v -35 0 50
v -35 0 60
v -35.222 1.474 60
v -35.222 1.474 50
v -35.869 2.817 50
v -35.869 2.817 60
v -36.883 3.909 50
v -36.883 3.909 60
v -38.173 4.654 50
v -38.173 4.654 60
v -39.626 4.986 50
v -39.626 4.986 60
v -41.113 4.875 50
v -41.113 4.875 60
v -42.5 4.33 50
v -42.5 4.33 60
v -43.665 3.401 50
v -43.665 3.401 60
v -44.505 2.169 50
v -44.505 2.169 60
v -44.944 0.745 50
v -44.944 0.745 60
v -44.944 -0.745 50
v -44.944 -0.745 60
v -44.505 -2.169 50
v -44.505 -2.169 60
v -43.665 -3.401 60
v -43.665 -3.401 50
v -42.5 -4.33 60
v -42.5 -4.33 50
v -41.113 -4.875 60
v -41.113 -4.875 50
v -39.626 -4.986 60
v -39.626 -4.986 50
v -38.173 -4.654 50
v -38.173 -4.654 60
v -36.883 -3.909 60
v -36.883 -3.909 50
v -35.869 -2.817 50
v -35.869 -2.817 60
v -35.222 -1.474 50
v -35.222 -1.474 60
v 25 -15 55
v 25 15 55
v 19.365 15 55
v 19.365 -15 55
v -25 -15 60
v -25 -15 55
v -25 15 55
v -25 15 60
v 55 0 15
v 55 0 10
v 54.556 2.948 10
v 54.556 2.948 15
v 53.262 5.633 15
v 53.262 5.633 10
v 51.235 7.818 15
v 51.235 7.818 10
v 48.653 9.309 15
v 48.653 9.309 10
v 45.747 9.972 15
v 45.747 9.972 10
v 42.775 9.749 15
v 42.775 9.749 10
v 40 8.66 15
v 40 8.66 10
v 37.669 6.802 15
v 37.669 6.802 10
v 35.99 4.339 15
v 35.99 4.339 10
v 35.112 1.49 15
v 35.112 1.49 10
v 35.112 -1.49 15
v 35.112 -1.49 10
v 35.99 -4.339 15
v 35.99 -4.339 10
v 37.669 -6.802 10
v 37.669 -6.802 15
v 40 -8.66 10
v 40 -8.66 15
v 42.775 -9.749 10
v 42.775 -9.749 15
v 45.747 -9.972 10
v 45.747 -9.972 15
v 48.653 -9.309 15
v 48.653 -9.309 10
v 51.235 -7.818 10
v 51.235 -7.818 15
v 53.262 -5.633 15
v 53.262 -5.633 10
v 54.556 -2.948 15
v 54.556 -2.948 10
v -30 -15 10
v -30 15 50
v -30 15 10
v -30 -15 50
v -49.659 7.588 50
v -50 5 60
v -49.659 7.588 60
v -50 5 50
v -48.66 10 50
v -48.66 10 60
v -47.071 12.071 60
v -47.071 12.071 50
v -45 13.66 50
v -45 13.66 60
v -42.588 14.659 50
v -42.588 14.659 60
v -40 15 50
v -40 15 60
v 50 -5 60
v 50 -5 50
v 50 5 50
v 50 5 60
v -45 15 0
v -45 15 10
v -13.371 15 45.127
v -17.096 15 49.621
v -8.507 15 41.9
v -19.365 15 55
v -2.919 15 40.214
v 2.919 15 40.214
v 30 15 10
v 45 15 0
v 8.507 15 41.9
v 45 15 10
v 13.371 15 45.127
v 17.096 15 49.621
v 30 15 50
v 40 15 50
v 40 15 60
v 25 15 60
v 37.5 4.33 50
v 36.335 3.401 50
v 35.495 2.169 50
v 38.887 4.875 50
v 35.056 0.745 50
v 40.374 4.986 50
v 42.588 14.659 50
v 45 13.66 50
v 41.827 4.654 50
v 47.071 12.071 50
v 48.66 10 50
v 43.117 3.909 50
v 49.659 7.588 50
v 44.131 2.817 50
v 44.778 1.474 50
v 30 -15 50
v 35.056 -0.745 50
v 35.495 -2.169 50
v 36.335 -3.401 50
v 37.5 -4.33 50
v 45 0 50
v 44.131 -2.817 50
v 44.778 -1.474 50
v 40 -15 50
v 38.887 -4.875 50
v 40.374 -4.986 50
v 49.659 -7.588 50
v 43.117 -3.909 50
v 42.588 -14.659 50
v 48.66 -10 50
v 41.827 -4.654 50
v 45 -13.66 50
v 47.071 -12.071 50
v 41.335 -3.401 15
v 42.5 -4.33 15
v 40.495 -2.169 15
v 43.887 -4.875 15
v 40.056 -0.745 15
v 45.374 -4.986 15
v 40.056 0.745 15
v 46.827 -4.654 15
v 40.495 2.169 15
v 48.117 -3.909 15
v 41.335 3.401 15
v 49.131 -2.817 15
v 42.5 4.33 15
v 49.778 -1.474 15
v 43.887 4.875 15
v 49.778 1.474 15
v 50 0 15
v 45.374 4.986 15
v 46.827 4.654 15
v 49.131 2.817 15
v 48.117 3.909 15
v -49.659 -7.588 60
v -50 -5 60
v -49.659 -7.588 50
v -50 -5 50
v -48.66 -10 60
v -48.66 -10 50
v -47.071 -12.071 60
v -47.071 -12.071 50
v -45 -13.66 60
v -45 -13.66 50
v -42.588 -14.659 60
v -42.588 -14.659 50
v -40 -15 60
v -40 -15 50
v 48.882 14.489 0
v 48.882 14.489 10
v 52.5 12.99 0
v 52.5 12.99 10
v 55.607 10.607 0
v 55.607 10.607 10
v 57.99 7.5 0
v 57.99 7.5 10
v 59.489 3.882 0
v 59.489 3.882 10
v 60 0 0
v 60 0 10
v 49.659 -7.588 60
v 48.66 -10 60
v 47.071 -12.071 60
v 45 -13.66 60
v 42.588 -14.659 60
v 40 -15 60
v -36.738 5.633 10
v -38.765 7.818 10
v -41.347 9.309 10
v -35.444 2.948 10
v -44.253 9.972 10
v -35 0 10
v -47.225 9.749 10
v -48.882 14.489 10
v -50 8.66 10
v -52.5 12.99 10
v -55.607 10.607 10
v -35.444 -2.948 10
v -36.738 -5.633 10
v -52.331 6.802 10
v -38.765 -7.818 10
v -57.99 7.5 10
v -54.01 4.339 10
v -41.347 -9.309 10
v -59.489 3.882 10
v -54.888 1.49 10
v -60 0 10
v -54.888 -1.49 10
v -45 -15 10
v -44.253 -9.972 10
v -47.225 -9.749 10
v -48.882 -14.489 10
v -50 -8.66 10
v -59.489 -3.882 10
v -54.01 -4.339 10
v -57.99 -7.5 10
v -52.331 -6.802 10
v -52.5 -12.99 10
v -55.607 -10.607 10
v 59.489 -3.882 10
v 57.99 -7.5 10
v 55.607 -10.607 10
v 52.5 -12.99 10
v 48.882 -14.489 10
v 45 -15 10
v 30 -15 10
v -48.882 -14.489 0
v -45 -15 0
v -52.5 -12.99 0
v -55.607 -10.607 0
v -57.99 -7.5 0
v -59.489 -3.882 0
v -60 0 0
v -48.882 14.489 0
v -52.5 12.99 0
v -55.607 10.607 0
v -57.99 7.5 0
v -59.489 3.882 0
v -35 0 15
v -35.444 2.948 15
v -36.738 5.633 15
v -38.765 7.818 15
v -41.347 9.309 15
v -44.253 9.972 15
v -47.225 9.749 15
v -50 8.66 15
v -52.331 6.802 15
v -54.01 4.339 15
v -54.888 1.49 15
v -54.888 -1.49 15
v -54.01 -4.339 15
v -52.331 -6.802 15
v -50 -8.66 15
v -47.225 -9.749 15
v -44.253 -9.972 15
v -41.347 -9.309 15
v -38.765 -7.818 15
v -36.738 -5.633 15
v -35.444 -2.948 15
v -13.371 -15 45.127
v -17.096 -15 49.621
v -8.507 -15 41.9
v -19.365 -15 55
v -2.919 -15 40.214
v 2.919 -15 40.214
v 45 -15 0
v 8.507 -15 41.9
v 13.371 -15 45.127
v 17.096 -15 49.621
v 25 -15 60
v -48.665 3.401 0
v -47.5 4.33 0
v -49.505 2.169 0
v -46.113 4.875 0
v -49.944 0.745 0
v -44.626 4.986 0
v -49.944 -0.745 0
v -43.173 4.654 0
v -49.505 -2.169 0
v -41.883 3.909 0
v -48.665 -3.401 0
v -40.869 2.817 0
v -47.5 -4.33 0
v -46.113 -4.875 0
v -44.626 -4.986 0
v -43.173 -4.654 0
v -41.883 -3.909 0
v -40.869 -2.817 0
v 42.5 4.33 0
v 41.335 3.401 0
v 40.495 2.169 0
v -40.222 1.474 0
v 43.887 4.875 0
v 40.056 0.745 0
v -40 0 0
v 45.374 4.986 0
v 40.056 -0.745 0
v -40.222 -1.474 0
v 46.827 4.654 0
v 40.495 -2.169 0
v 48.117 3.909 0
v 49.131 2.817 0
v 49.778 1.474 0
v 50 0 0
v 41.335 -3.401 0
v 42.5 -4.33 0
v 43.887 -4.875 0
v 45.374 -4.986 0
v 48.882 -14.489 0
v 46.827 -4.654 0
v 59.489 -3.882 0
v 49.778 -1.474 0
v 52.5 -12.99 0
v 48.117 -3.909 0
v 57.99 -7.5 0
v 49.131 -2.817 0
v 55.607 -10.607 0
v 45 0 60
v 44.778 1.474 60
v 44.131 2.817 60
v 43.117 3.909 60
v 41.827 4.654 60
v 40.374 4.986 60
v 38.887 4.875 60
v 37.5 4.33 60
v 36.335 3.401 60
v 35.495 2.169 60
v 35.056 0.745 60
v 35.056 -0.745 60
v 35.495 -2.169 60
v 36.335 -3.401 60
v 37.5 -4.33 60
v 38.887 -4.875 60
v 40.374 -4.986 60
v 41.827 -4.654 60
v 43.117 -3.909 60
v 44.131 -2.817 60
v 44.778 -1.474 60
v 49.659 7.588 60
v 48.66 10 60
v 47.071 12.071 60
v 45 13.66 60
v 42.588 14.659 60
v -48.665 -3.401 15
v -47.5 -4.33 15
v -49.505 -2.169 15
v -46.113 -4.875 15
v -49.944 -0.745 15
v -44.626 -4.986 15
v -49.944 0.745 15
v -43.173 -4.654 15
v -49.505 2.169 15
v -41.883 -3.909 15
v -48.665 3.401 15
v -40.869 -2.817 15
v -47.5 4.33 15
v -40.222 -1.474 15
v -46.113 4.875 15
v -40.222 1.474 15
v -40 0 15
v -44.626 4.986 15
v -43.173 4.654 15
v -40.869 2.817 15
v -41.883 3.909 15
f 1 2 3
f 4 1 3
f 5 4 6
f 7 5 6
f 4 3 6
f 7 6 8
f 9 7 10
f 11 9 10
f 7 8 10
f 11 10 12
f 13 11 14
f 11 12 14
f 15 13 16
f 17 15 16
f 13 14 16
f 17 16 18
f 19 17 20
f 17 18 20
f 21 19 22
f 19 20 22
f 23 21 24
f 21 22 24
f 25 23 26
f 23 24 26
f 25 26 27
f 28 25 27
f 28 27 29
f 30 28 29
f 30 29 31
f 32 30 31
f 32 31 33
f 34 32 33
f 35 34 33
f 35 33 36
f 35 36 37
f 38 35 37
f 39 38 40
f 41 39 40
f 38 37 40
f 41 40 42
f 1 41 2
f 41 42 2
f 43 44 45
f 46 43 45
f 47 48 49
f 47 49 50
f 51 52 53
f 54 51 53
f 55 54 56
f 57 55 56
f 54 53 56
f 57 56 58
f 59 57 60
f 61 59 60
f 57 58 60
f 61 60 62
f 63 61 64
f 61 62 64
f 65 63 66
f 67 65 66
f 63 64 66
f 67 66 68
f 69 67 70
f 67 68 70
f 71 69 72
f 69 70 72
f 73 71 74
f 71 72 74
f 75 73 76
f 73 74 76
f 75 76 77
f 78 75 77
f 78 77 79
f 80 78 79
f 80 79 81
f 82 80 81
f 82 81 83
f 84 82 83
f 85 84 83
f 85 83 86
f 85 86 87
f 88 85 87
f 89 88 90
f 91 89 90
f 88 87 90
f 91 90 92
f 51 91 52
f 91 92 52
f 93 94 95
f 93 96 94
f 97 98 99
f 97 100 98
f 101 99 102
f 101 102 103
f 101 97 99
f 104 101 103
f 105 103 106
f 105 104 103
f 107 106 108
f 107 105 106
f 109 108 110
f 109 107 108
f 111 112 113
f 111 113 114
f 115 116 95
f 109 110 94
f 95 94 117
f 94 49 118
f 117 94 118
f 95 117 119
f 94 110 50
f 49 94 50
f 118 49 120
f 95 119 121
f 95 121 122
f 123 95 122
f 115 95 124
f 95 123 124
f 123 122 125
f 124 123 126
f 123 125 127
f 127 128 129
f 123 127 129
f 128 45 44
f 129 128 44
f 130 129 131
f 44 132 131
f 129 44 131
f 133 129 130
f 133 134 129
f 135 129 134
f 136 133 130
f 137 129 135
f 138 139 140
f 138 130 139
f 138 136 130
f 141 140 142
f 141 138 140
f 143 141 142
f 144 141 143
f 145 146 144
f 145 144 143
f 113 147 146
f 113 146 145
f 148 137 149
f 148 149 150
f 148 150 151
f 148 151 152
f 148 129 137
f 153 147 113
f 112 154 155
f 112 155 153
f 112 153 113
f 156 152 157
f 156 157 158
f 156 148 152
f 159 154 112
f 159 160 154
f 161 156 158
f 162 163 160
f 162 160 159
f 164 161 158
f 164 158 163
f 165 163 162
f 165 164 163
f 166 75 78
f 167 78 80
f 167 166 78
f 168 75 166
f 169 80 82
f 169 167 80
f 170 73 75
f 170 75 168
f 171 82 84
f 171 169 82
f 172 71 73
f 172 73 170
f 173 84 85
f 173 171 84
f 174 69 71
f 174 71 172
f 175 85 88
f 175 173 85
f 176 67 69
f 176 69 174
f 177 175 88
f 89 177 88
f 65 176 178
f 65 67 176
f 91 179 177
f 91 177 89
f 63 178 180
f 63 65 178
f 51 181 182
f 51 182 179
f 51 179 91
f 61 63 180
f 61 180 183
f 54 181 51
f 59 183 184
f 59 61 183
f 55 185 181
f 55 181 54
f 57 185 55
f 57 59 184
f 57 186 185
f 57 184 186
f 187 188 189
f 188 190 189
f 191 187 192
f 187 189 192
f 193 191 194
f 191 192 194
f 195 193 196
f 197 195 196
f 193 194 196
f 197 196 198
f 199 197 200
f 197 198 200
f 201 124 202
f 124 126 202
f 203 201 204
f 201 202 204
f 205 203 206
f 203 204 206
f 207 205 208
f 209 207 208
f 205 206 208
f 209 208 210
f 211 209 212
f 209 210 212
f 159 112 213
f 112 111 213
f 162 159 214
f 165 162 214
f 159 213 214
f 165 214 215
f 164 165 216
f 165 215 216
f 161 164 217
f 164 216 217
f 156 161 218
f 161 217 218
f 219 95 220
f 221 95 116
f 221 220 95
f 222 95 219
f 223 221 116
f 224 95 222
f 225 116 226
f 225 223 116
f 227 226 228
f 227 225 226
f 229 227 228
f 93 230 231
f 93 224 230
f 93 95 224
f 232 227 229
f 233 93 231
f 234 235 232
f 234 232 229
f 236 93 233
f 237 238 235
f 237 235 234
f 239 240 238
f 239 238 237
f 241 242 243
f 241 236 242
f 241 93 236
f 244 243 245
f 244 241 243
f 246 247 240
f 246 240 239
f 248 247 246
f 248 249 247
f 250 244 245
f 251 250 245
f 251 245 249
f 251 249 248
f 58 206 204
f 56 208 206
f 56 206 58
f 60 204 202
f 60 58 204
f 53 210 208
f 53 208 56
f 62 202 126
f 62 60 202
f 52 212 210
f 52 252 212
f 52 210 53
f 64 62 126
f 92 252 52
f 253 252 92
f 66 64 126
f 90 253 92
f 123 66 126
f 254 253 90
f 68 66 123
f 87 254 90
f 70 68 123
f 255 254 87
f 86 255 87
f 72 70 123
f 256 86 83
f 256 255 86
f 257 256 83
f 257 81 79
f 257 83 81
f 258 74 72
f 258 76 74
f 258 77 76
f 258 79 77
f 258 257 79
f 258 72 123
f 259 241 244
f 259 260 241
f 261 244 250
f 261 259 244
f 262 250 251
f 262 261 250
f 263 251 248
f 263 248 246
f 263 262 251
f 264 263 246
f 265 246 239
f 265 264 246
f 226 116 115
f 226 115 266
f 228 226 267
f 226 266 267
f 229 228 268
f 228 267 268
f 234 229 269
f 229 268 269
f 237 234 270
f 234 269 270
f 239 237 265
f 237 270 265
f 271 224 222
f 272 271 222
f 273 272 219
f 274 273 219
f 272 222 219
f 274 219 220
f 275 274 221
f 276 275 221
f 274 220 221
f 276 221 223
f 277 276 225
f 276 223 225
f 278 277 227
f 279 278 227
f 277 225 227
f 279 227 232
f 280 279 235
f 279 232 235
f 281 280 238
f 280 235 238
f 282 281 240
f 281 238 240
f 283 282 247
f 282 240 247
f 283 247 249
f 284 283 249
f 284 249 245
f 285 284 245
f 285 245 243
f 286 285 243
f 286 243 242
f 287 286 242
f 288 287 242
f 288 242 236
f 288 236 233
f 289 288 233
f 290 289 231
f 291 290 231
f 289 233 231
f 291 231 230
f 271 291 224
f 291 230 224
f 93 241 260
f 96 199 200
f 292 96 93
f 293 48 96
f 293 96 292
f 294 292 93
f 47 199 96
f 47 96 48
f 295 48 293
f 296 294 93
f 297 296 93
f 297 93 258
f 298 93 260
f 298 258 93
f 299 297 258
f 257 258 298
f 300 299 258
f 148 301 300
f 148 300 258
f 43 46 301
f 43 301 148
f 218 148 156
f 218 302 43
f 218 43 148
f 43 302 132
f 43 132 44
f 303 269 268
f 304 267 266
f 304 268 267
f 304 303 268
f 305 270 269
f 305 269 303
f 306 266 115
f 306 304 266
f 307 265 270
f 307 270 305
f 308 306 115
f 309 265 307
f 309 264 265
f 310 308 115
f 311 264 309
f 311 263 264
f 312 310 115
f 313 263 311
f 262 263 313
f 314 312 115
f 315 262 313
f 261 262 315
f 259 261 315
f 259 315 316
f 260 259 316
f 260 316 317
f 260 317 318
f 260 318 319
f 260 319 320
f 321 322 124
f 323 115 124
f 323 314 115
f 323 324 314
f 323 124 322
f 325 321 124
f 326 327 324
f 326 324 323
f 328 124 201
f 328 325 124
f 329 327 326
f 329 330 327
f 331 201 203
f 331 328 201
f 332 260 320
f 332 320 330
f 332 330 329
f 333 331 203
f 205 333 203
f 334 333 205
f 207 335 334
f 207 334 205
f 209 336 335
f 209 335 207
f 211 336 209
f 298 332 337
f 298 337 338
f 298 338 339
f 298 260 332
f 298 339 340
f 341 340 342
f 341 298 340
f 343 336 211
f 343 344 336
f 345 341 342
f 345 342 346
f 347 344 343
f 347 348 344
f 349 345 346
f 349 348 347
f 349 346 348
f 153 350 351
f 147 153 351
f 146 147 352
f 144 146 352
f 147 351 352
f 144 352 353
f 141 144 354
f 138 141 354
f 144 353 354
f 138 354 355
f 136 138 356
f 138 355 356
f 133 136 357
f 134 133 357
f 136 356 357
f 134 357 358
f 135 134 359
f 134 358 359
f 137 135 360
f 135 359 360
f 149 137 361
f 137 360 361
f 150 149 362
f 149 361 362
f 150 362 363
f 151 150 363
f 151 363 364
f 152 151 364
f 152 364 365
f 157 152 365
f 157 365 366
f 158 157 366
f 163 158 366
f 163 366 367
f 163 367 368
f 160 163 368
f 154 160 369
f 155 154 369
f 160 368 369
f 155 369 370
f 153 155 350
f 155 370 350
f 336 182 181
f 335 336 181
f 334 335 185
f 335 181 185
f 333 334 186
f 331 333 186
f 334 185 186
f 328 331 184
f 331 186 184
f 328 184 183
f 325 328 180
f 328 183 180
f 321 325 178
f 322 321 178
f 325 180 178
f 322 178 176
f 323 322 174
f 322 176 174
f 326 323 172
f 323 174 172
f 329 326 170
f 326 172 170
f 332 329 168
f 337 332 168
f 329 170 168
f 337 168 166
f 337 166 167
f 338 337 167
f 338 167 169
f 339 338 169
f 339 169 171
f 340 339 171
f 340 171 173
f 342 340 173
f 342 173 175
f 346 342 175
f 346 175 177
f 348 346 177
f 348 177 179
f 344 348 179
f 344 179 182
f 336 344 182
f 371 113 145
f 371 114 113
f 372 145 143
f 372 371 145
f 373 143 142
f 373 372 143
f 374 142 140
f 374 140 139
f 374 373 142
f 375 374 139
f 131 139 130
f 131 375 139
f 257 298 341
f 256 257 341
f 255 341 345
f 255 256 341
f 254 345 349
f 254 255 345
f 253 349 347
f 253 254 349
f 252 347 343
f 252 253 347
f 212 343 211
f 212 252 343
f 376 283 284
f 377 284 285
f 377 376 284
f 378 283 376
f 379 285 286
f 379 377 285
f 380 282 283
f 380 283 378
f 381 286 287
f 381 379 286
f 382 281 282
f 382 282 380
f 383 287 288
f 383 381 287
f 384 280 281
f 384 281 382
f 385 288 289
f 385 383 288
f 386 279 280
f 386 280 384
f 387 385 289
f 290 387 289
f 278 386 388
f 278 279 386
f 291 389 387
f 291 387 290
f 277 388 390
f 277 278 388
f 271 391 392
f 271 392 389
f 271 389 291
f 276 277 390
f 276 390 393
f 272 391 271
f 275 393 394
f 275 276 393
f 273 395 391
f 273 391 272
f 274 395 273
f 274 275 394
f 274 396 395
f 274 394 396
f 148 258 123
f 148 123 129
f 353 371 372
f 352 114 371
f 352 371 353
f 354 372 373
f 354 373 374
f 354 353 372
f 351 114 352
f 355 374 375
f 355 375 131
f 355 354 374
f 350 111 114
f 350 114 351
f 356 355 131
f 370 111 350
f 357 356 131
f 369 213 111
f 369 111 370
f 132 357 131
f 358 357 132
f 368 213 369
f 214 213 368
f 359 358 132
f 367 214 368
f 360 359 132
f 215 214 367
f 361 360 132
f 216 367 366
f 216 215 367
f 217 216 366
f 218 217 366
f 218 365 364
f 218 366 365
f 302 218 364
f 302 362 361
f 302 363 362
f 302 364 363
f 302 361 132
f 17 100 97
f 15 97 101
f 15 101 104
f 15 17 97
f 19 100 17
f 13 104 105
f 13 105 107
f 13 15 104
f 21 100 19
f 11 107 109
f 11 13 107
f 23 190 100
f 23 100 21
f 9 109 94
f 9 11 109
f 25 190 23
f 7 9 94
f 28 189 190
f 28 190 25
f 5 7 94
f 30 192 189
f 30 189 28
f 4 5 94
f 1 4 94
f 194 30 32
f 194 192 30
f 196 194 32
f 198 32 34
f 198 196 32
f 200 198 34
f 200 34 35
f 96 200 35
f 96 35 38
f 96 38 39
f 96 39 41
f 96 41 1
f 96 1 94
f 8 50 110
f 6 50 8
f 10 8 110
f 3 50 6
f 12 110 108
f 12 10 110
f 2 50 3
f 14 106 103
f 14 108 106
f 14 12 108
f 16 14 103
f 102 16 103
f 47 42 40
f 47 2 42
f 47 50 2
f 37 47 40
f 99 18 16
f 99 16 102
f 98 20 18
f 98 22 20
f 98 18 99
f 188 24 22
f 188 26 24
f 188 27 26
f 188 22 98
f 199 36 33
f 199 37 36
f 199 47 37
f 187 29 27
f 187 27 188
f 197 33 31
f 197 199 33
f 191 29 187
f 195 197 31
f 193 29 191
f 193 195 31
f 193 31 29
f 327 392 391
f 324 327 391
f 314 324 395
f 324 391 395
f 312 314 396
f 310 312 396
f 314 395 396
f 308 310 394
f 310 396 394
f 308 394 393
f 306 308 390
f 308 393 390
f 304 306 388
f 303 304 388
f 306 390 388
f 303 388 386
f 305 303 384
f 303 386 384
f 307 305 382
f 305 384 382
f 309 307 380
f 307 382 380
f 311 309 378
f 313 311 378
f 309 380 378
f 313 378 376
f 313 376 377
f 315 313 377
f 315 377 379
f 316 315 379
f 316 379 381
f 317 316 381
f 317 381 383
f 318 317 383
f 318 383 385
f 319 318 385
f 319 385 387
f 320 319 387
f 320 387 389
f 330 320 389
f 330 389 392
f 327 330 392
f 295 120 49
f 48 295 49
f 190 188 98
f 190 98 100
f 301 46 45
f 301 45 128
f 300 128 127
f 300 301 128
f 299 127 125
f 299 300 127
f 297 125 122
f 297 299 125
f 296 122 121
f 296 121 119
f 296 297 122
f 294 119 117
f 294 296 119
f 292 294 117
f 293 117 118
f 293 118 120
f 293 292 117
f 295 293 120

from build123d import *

# Parameters (mm, degrees)
F1_DEPTH         = 15
F2_R             = 10
F3_R             = 14.99999
F4_R             = 5
F5_DEPTH         = 10
F6_R             = 10
F7_DEPTH         = 5
F8_R             = 10
F9_DEPTH         = 5
F12_D            = 10
F12_DEPTH        = 15.001
F12_ON_F11_D     = 10
F12_ON_F11_DEPTH = 15.001


# Not quite as in the source:
# - a fillet or chamfer is up to 0.001 mm smaller than in the source, because OpenCascade refuses the exact size


with BuildPart() as f1:
    # F0 (on Front) → F1 (new body, symmetric)
    with BuildSketch(Plane.XZ):
        with BuildLine():
            Line((-60, 10), (-60, 0))
            Line((-60, 0), (60, 0))
            Line((60, 0), (60, 10))
            Line((60, 10), (30, 10))
            Line((30, 10), (30, 50))
            Line((30, 50), (50, 50))
            Line((50, 50), (50, 60))
            Line((50, 60), (25, 60))
            Line((25, 60), (25, 55))
            Line((25, 55), (19.364916731, 55))
            ThreePointArc((19.364916731, 55), (0, 40), (-19.364916731, 55))
            Line((-19.364916731, 55), (-25, 55))
            Line((-25, 55), (-25, 60))
            Line((-25, 60), (-50, 60))
            Line((-50, 60), (-50, 50))
            Line((-50, 50), (-30, 50))
            Line((-30, 50), (-30, 10))
            Line((-30, 10), (-60, 10))
        make_face()
    extrude(amount=F1_DEPTH, both=True)

    # F2
    f2_edges = [f1.edges().sort_by_distance(p)[0] for p in [
        (-50, -15, 55),
        (50, -15, 55),
        (50, 15, 55),
        (-50, 15, 55),
    ]]
    fillet(f2_edges, radius=F2_R)

    # F3 (radius 15 in the source; OpenCascade refuses exactly that, so slightly less here)
    f3_edges = [f1.edges().sort_by_distance(p)[0] for p in [
        (60, 15, 5),
        (-60, 15, 5),
        (-60, -15, 5),
        (60, -15, 5),
    ]]
    fillet(f3_edges, radius=F3_R)

    # F4 (on face) → F5 (cut, through all)
    with BuildSketch(Plane.XY.offset(60)):
        with Locations((40, 0)):
            Circle(F4_R)
        with Locations((-40, 0)):
            Circle(F4_R)
    extrude(amount=-F5_DEPTH, mode=Mode.SUBTRACT)

    # F6 (on face) → F7 (join)
    with BuildSketch(Plane.XY.offset(10)):
        with Locations((45, 0)):
            Circle(F6_R)
    extrude(amount=F7_DEPTH)

    # F8 (on face) → F9 (join)
    with BuildSketch(Plane.XY.offset(10)):
        with Locations((-45, 0)):
            Circle(F8_R)
    extrude(amount=F9_DEPTH)

    # F12 (through all, one way)
    with BuildSketch(Plane.XY.offset(15)):
        with Locations((-45, 0)):
            Circle(F12_D / 2)
    extrude(amount=-F12_DEPTH, mode=Mode.SUBTRACT)

    # F12 on F11 (through all, one way)
    with BuildSketch(Plane.XY.offset(15)):
        with Locations((45, 0)):
            Circle(F12_ON_F11_D / 2)
    extrude(amount=-F12_ON_F11_DEPTH, mode=Mode.SUBTRACT)


solid = f1.part
